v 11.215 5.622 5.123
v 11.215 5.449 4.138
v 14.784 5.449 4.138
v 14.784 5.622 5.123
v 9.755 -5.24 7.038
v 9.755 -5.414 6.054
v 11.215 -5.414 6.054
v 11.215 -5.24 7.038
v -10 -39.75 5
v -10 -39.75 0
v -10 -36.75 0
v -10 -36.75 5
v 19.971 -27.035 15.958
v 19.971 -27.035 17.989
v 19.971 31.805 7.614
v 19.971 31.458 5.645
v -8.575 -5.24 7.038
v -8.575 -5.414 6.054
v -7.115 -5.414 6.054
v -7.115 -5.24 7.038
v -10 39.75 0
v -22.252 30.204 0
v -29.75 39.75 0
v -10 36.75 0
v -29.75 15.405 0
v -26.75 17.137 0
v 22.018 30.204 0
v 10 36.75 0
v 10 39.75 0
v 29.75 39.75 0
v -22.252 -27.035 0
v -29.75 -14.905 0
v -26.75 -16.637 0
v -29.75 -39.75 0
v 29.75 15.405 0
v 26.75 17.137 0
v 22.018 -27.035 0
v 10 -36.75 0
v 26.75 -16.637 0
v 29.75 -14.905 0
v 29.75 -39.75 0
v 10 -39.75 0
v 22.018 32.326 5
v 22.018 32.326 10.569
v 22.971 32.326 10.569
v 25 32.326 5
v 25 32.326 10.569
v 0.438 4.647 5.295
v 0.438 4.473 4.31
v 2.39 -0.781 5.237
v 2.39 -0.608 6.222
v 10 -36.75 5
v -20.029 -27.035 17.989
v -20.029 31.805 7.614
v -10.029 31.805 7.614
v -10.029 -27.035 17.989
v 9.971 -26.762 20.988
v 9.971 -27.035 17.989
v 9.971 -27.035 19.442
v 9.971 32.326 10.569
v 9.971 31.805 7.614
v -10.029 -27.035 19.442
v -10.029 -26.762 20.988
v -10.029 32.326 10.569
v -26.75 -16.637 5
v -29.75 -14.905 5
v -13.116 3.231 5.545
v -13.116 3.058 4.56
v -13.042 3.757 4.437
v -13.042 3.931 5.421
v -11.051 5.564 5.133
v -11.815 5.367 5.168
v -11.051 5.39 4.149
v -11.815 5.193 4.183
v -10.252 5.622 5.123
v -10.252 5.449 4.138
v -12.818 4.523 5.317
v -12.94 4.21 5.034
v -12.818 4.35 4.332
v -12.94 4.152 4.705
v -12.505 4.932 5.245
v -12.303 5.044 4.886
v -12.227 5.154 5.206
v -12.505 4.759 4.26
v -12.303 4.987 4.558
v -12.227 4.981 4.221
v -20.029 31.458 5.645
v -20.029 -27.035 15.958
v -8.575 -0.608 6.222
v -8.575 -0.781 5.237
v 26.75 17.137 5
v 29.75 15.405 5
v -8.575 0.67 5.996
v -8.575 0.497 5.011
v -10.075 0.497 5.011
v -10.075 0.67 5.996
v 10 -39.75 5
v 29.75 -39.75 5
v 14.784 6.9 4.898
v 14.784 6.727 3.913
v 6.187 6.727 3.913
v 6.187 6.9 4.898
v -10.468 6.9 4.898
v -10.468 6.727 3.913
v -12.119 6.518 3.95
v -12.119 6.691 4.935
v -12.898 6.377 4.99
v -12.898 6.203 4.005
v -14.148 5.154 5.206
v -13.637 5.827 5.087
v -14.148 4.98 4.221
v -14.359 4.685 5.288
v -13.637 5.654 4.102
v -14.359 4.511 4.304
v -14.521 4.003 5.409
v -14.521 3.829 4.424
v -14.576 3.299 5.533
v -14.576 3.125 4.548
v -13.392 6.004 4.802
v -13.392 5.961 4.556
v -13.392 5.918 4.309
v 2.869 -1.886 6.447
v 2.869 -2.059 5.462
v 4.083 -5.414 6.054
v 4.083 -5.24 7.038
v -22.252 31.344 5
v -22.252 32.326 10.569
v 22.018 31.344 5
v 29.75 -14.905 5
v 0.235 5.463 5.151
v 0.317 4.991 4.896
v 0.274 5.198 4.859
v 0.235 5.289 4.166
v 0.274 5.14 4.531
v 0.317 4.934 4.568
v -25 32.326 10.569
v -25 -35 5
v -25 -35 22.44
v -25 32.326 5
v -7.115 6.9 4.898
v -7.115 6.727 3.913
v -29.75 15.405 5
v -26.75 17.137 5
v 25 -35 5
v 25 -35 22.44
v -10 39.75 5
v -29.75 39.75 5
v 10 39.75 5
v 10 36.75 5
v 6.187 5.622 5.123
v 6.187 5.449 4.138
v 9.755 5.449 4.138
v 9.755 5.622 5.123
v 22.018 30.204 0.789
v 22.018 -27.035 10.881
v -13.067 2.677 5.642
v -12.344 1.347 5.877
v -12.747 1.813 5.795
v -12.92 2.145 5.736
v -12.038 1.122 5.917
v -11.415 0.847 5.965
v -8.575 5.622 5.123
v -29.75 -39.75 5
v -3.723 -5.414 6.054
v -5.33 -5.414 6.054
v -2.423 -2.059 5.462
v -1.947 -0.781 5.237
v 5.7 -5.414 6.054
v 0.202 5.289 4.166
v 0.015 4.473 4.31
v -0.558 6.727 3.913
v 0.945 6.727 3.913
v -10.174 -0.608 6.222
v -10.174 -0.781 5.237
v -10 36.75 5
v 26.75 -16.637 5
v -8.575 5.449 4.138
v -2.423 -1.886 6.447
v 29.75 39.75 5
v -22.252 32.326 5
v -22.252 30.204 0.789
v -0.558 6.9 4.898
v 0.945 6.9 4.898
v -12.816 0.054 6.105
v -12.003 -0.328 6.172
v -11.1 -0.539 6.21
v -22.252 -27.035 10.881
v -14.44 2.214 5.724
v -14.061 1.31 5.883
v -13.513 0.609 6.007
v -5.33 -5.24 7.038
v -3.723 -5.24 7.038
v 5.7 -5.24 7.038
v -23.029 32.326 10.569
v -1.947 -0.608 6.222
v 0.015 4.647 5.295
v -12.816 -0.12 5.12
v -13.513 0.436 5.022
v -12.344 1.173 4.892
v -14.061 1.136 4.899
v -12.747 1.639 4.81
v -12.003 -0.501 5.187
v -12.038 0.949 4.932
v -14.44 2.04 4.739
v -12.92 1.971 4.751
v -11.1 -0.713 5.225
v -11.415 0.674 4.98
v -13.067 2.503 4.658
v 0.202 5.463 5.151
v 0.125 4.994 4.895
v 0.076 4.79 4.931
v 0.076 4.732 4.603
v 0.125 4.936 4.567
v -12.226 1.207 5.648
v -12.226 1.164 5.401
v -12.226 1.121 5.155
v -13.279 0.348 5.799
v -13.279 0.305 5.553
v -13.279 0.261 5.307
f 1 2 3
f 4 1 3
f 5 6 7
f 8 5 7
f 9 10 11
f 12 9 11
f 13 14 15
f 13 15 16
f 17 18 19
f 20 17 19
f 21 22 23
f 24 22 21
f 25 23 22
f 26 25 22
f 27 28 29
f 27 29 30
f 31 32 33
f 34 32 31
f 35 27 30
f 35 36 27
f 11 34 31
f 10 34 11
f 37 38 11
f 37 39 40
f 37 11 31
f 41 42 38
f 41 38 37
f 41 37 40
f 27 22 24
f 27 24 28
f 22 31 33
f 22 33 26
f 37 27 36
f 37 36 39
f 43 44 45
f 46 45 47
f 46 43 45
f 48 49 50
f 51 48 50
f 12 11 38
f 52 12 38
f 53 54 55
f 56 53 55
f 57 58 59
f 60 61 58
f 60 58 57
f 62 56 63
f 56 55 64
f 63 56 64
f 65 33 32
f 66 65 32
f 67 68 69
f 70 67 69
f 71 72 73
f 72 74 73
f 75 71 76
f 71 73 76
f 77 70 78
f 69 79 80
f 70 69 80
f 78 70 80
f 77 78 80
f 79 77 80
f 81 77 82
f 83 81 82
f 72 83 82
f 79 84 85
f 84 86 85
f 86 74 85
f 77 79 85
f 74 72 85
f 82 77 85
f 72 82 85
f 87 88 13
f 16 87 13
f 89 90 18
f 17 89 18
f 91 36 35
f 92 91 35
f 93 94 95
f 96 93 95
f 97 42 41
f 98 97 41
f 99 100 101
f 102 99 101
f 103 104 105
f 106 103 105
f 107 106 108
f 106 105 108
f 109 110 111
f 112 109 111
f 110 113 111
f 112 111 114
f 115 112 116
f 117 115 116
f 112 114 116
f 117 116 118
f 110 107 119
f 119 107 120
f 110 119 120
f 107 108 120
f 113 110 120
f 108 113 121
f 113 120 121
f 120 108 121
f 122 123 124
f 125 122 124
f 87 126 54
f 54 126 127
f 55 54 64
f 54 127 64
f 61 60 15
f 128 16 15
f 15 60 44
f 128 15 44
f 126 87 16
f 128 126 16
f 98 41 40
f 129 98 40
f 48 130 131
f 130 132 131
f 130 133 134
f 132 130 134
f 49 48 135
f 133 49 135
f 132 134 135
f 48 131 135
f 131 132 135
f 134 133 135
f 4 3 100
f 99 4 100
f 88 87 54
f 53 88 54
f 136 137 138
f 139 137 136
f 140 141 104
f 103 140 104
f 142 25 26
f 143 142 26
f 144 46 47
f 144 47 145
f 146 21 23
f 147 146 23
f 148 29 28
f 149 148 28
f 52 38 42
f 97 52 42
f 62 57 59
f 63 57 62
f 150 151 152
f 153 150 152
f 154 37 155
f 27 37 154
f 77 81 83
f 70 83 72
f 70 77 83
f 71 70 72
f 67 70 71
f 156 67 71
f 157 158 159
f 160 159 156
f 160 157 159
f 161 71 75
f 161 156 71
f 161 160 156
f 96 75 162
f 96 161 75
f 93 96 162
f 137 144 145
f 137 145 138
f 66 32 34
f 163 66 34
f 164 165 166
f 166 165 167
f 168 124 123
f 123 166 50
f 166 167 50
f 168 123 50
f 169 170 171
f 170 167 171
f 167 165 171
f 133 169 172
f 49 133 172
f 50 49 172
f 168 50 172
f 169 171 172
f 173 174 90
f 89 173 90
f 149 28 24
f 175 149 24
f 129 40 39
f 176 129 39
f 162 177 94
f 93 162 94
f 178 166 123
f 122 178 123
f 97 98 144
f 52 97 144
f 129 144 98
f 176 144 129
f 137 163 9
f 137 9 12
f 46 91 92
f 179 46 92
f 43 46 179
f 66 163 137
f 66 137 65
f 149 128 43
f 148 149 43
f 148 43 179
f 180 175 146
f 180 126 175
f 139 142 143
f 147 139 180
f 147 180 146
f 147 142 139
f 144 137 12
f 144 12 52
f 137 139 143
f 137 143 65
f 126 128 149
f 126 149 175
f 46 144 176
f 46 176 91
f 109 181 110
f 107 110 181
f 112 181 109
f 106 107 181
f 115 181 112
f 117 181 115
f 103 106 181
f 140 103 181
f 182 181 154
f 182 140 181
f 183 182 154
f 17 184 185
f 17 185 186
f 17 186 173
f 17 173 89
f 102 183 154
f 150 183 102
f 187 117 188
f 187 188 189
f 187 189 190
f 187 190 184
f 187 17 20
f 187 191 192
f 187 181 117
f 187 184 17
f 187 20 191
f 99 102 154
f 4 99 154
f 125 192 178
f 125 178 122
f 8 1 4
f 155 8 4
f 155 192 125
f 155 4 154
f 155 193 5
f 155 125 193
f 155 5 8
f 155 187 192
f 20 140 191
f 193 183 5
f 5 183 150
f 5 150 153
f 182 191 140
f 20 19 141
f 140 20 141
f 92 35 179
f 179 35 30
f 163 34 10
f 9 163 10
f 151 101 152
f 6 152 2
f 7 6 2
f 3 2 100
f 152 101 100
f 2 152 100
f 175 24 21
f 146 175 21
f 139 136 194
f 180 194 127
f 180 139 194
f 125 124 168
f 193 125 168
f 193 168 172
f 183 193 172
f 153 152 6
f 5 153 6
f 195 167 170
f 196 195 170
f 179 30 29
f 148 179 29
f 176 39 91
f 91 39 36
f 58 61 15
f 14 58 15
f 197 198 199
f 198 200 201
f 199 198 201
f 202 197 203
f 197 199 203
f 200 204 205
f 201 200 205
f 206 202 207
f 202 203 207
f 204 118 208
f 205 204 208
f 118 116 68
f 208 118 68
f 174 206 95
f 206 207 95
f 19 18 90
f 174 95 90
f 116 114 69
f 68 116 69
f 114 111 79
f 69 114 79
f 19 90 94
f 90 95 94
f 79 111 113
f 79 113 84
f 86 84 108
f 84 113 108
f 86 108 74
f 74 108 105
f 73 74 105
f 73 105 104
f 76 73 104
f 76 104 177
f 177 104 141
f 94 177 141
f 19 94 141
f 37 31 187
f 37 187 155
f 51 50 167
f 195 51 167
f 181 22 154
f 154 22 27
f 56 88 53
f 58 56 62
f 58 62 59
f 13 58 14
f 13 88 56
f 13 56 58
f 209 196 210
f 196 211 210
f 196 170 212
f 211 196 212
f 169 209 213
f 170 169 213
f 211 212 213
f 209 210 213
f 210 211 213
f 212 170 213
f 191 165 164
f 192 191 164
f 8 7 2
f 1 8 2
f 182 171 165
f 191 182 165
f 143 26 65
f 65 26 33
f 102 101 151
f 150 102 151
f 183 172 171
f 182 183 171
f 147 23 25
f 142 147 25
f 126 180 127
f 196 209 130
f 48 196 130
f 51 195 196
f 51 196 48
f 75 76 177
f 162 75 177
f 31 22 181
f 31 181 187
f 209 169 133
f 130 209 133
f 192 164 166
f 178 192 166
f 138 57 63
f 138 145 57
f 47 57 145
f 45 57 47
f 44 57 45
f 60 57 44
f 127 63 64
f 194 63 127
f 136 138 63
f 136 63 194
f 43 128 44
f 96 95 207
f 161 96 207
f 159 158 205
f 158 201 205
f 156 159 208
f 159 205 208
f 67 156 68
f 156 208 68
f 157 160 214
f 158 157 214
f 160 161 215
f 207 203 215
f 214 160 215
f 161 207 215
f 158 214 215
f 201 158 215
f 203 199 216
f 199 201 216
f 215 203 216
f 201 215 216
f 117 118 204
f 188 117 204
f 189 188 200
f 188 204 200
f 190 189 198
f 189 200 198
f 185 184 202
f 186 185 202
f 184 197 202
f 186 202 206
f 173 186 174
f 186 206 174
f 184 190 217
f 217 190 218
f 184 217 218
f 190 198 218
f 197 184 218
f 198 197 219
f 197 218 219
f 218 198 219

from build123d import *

# Parameters (mm, degrees)
BOSS_EXTRUDE1_DEPTH = 5
SKETCH8_W           = 50
SKETCH8_H           = 70
CUT_EXTRUDE2_DEPTH  = 50
BOSS_EXTRUDE2_START = -30
SKETCH6_W           = 3
SKETCH6_H           = 2
SKETCH6_H_2         = 3
SKETCH6_W_2         = 10
BOSS_EXTRUDE2_DEPTH = 60
BOSS_EXTRUDE3_START = -30
SKETCH7_W           = 46
SKETCH7_H           = 5
BOSS_EXTRUDE3_DEPTH = 3
SKETCH11_W          = 46
SKETCH11_H          = 63
BOSS_EXTRUDE4_DEPTH = 5
BOSS_EXTRUDE6_REACH = 56.109
SKETCH13_W          = 51.830863245
SKETCH13_H          = 5.290230228
BOSS_EXTRUDE7_DEPTH = 5
BOSS_EXTRUDE8_START = 5.021523682
BOSS_EXTRUDE8_DEPTH = 1.000000021


# Read off the part's stored shape, not the designer's step: Boss-Extrude8
with BuildPart() as part:
    # Sketch4 → Boss-Extrude1 (new body)
    with BuildSketch(Plane(origin=(0, 0, 0), x_dir=(0, 1, 0), z_dir=(0, 0, 1))):
        Polygon((-39.75, -29.75), (-14.905444566, -29.75), (-16.637495374, -26.75), (0.24999995, -26.75), (17.137495374, -26.75), (15.405444566, -29.75), (39.75, -29.75), (39.75, -10), (36.75, -10), (36.75, 10), (39.75, 10), (39.75, 29.75), (15.405444566, 29.75), (17.137495374, 26.75), (0.250000065, 26.75), (-16.637495374, 26.75), (-14.905444566, 29.75), (-39.75, 29.75), (-39.75, 10), (-36.75, 10), (-36.75, -10), (-39.75, -10), align=None)
    extrude(amount=BOSS_EXTRUDE1_DEPTH)

    # Sketch8 → Cut-Extrude2 (cut)
    with BuildSketch(Plane(origin=(0, 0, 0), x_dir=(1, 0, 0), z_dir=(0, 0, -1))):
        Rectangle(SKETCH8_W, SKETCH8_H)
    extrude(amount=-CUT_EXTRUDE2_DEPTH, mode=Mode.SUBTRACT)



with BuildPart() as body_2:
    # Sketch6 → Boss-Extrude2 (new body)
    with BuildSketch(Plane(origin=(0, -0.558315077, -3.166362145), x_dir=(1, 0, 0), z_dir=(0, -0.9848077530122069, 0.1736481776669375)).offset(BOSS_EXTRUDE2_START)):
        with Locations((-21.528635138, 15.236732087)):
            Rectangle(SKETCH6_W, SKETCH6_H)
        with Locations((-21.528635138, 17.736732087)):
            Rectangle(SKETCH6_W, SKETCH6_H_2)
        with Locations((-15.028635138, 17.736732087)):
            Rectangle(SKETCH6_W_2, SKETCH6_H_2)
        with Locations((21.471364862, 15.236732087)):
            Rectangle(SKETCH6_W, SKETCH6_H)
        with Locations((21.471364862, 17.736732087)):
            Rectangle(SKETCH6_W, SKETCH6_H_2)
        with Locations((14.971364862, 17.736732087)):
            Rectangle(SKETCH6_W_2, SKETCH6_H_2)
    extrude(amount=BOSS_EXTRUDE2_DEPTH)



with BuildPart() as body_3:
    # Sketch7 → Boss-Extrude3 (new body)
    with BuildSketch(Plane(origin=(0, 0, 0), x_dir=(-1, 0, 0), z_dir=(0, 0.9848077530122069, -0.1736481776669375)).offset(BOSS_EXTRUDE3_START)):
        with Locations((0.028635138, 13.521523703)):
            Rectangle(SKETCH7_W, SKETCH7_H)
    extrude(amount=-BOSS_EXTRUDE3_DEPTH)


with BuildPart() as body_2_1:
    add(body_2.part)

    add(body_3.part)  # Boss-Extrude4 merges body 3
    # Sketch11 → Boss-Extrude4 (add)
    with BuildSketch(Plane(origin=(0, 1.913867506, 10.854081993), x_dir=(1, 0, 0), z_dir=(0, -0.17364817766693746, -0.9848077530122068))):
        with Locations((-0.028635138, 1.5)):
            Rectangle(SKETCH11_W, SKETCH11_H)
    extrude(amount=BOSS_EXTRUDE4_DEPTH)


with BuildPart() as part_1:
    add(part.part)

    add(body_2_1.part)  # Boss-Extrude6 merges body 2
    # Boss-Extrude6: up to this plane
    boss_extrude6_end = Plane(origin=(22.971364862, 32.326340985, 10.568675428), z_dir=(0, 0.17364817766693744, 0.9848077530122069))
    # Sketch12 → Boss-Extrude6 (add, up to the surface)
    with BuildSketch(Plane(origin=(0, 0, 0), x_dir=(1, 0, 0), z_dir=(0, 0, -1)), mode=Mode.PRIVATE) as boss_extrude6_sk1:
        Polygon((-25, -32.326340985), (-22.25188492, -32.326340985), (-22.25188492, 27.03466657), (22.017654552, 27.03466657), (22.017654552, -32.326340985), (25, -32.326340985), (25, 35), (-25, 35), align=None)
    boss_extrude6_tool1 = split(extrude(boss_extrude6_sk1.sketch, amount=-BOSS_EXTRUDE6_REACH, mode=Mode.PRIVATE), bisect_by=boss_extrude6_end, keep=Keep.BOTH, mode=Mode.PRIVATE)
    add(boss_extrude6_tool1.solids().sort_by_distance((-23.625942, 31.487721, 0))[0])

    # Sketch13 → Boss-Extrude7 (add)
    with BuildSketch(Plane(origin=(0, 0, 0), x_dir=(1, 0, 0), z_dir=(0, 0, -1))):
        with Locations((-0.078348401, -32.848959795)):
            Rectangle(SKETCH13_W, SKETCH13_H)
    extrude(amount=-BOSS_EXTRUDE7_DEPTH)

    # Boss-Extrude8 outline → Boss-Extrude8 (add)
    # profile 1 of 3: a face of its own
    with BuildSketch(Plane(origin=(0, 0, 0), x_dir=(1, 0, 0), z_dir=(0, 0.1736481776669375, 0.9848077530122069)).offset(BOSS_EXTRUDE8_START)):
        with BuildLine():
            add(Edge.make_bspline(
                [(-10.467851841, 5.945152171), (-10.986974105, 5.93651447), (-11.500854153, 5.896229421), (-12.498790484, 5.635612757), (-12.985546819, 5.414483257), (-13.797961559, 4.74423563), (-14.118849525, 4.313672985), (-14.500878838, 3.342927953), (-14.563491586, 2.813042118), (-14.576316895, 2.28783257)],
                knots=[0, 0, 0, 0, 0.25, 0.25, 0.5, 0.5, 0.75, 0.75, 1, 1, 1, 1], degree=3))
            add(Edge.make_bspline(
                [(-14.576316895, 2.28783257), (-14.564248114, 1.730329849), (-14.485127057, 1.171617147), (-14.041607684, 0.154100247), (-13.697450783, -0.299455445), (-12.861318405, -1.029274155), (-12.357191638, -1.292181087), (-11.287857522, -1.614507239), (-10.731412411, -1.666616468), (-10.173846939, -1.678699083)],
                knots=[0, 0, 0, 0, 0.25, 0.25, 0.5, 0.5, 0.75, 0.75, 1, 1, 1, 1], degree=3))
            Line((-10.173846939, -1.678699083), (-8.574561652, -1.678699083))
            Line((-8.574561652, -1.678699083), (-8.574561652, -6.382777516))
            Line((-8.574561652, -6.382777516), (-7.114675242, -6.382777516))
            Line((-7.114675242, -6.382777516), (-7.114675242, 5.945152171))
            Line((-7.114675242, 5.945152171), (-10.467851841, 5.945152171))
        make_face()
        with BuildLine():
            Line((-8.574561652, -0.381022274), (-10.075000463, -0.381022274))
            add(Edge.make_bspline(
                [(-10.075000463, -0.381022274), (-10.454019642, -0.376067015), (-10.82957333, -0.347620207), (-11.563501324, -0.174272567), (-11.922431464, -0.026106182), (-12.530252018, 0.44277106), (-12.769732325, 0.751236277), (-13.058396455, 1.452245522), (-13.106849265, 1.837560064), (-13.116430485, 2.219400395)],
                knots=[0, 0, 0, 0, 0.25, 0.25, 0.5, 0.5, 0.75, 0.75, 1, 1, 1, 1], degree=3))
            add(Edge.make_bspline(
                [(-13.116430485, 2.219400395), (-13.111547413, 2.5782319), (-13.069607652, 2.936381873), (-12.8109443, 3.606784644), (-12.593110897, 3.90761083), (-11.721692221, 4.542687822), (-10.970699083, 4.634581597), (-10.252417214, 4.647475362)],
                knots=[0, 0, 0, 0, 0.25, 0.25, 0.5, 0.5, 1, 1, 1, 1], degree=3))
            Line((-10.252417214, 4.647475362), (-8.574561652, 4.647475362))
            Line((-8.574561652, 4.647475362), (-8.574561652, -0.381022274))
        make_face(mode=Mode.SUBTRACT)
    # profile 2 of 3: a face of its own
    with BuildSketch(Plane(origin=(0, 0, 0), x_dir=(1, 0, 0), z_dir=(0, 0.1736481776669375, 0.9848077530122069)).offset(BOSS_EXTRUDE8_START)):
        Polygon((14.783620913, 4.647475362), (14.783620913, 5.945152171), (6.186512052, 5.945152171), (6.186512052, 4.647475362), (9.755123278, 4.647475362), (9.755123278, -6.382777516), (11.215009688, -6.382777516), (11.215009688, 4.647475362), align=None)
    # profile 3 of 3: a face of its own
    with BuildSketch(Plane(origin=(0, 0, 0), x_dir=(1, 0, 0), z_dir=(0, 0.1736481776669375, 0.9848077530122069)).offset(BOSS_EXTRUDE8_START)):
        Polygon((5.699883249, -6.382777516), (0.945114315, 5.945152171), (-0.55785902, 5.945152171), (-5.330369629, -6.382777516), (-3.723480768, -6.382777516), (-2.423269434, -2.976375892), (2.868818804, -2.976375892), (4.082856287, -6.382777516), align=None)
        with BuildLine():
            Line((0.202498485, 4.485265761), (0.23544731, 4.485265761))
            add(Edge.make_bspline(
                [(0.23544731, 4.485265761), (0.247945589, 4.41509498), (0.260444435, 4.344921063), (0.273754544, 4.274899734), (0.287066266, 4.20486992), (0.301165705, 4.134968363), (0.317053985, 4.065477793), (0.34874631, 3.92686507), (0.391135692, 3.790647481), (0.438209312, 3.65647608)],
                knots=[0, 0, 0, 0, 0.250067921, 0.250067921, 0.250067921, 0.500190861, 0.500190861, 0.500190861, 1, 1, 1, 1], degree=3))
            Line((0.438209312, 3.65647608), (2.389793575, -1.678699083))
            Line((2.389793575, -1.678699083), (-1.94677873, -1.678699083))
            Line((-1.94677873, -1.678699083), (0.014943634, 3.65647608))
            add(Edge.make_bspline(
                [(0.014943634, 3.65647608), (0.036185093, 3.724160229), (0.057270848, 3.791932402), (0.075717575, 3.860431029), (0.094170953, 3.928954356), (0.110345138, 3.998113348), (0.124780214, 4.067594296), (0.153586161, 4.206247155), (0.177650794, 4.345849154), (0.202498485, 4.485265761)],
                knots=[0, 0, 0, 0, 0.250210129, 0.250210129, 0.250210129, 0.500538862, 0.500538862, 0.500538862, 1, 1, 1, 1], degree=3))
        make_face(mode=Mode.SUBTRACT)
    extrude(amount=BOSS_EXTRUDE8_DEPTH)


solid = part_1.part
